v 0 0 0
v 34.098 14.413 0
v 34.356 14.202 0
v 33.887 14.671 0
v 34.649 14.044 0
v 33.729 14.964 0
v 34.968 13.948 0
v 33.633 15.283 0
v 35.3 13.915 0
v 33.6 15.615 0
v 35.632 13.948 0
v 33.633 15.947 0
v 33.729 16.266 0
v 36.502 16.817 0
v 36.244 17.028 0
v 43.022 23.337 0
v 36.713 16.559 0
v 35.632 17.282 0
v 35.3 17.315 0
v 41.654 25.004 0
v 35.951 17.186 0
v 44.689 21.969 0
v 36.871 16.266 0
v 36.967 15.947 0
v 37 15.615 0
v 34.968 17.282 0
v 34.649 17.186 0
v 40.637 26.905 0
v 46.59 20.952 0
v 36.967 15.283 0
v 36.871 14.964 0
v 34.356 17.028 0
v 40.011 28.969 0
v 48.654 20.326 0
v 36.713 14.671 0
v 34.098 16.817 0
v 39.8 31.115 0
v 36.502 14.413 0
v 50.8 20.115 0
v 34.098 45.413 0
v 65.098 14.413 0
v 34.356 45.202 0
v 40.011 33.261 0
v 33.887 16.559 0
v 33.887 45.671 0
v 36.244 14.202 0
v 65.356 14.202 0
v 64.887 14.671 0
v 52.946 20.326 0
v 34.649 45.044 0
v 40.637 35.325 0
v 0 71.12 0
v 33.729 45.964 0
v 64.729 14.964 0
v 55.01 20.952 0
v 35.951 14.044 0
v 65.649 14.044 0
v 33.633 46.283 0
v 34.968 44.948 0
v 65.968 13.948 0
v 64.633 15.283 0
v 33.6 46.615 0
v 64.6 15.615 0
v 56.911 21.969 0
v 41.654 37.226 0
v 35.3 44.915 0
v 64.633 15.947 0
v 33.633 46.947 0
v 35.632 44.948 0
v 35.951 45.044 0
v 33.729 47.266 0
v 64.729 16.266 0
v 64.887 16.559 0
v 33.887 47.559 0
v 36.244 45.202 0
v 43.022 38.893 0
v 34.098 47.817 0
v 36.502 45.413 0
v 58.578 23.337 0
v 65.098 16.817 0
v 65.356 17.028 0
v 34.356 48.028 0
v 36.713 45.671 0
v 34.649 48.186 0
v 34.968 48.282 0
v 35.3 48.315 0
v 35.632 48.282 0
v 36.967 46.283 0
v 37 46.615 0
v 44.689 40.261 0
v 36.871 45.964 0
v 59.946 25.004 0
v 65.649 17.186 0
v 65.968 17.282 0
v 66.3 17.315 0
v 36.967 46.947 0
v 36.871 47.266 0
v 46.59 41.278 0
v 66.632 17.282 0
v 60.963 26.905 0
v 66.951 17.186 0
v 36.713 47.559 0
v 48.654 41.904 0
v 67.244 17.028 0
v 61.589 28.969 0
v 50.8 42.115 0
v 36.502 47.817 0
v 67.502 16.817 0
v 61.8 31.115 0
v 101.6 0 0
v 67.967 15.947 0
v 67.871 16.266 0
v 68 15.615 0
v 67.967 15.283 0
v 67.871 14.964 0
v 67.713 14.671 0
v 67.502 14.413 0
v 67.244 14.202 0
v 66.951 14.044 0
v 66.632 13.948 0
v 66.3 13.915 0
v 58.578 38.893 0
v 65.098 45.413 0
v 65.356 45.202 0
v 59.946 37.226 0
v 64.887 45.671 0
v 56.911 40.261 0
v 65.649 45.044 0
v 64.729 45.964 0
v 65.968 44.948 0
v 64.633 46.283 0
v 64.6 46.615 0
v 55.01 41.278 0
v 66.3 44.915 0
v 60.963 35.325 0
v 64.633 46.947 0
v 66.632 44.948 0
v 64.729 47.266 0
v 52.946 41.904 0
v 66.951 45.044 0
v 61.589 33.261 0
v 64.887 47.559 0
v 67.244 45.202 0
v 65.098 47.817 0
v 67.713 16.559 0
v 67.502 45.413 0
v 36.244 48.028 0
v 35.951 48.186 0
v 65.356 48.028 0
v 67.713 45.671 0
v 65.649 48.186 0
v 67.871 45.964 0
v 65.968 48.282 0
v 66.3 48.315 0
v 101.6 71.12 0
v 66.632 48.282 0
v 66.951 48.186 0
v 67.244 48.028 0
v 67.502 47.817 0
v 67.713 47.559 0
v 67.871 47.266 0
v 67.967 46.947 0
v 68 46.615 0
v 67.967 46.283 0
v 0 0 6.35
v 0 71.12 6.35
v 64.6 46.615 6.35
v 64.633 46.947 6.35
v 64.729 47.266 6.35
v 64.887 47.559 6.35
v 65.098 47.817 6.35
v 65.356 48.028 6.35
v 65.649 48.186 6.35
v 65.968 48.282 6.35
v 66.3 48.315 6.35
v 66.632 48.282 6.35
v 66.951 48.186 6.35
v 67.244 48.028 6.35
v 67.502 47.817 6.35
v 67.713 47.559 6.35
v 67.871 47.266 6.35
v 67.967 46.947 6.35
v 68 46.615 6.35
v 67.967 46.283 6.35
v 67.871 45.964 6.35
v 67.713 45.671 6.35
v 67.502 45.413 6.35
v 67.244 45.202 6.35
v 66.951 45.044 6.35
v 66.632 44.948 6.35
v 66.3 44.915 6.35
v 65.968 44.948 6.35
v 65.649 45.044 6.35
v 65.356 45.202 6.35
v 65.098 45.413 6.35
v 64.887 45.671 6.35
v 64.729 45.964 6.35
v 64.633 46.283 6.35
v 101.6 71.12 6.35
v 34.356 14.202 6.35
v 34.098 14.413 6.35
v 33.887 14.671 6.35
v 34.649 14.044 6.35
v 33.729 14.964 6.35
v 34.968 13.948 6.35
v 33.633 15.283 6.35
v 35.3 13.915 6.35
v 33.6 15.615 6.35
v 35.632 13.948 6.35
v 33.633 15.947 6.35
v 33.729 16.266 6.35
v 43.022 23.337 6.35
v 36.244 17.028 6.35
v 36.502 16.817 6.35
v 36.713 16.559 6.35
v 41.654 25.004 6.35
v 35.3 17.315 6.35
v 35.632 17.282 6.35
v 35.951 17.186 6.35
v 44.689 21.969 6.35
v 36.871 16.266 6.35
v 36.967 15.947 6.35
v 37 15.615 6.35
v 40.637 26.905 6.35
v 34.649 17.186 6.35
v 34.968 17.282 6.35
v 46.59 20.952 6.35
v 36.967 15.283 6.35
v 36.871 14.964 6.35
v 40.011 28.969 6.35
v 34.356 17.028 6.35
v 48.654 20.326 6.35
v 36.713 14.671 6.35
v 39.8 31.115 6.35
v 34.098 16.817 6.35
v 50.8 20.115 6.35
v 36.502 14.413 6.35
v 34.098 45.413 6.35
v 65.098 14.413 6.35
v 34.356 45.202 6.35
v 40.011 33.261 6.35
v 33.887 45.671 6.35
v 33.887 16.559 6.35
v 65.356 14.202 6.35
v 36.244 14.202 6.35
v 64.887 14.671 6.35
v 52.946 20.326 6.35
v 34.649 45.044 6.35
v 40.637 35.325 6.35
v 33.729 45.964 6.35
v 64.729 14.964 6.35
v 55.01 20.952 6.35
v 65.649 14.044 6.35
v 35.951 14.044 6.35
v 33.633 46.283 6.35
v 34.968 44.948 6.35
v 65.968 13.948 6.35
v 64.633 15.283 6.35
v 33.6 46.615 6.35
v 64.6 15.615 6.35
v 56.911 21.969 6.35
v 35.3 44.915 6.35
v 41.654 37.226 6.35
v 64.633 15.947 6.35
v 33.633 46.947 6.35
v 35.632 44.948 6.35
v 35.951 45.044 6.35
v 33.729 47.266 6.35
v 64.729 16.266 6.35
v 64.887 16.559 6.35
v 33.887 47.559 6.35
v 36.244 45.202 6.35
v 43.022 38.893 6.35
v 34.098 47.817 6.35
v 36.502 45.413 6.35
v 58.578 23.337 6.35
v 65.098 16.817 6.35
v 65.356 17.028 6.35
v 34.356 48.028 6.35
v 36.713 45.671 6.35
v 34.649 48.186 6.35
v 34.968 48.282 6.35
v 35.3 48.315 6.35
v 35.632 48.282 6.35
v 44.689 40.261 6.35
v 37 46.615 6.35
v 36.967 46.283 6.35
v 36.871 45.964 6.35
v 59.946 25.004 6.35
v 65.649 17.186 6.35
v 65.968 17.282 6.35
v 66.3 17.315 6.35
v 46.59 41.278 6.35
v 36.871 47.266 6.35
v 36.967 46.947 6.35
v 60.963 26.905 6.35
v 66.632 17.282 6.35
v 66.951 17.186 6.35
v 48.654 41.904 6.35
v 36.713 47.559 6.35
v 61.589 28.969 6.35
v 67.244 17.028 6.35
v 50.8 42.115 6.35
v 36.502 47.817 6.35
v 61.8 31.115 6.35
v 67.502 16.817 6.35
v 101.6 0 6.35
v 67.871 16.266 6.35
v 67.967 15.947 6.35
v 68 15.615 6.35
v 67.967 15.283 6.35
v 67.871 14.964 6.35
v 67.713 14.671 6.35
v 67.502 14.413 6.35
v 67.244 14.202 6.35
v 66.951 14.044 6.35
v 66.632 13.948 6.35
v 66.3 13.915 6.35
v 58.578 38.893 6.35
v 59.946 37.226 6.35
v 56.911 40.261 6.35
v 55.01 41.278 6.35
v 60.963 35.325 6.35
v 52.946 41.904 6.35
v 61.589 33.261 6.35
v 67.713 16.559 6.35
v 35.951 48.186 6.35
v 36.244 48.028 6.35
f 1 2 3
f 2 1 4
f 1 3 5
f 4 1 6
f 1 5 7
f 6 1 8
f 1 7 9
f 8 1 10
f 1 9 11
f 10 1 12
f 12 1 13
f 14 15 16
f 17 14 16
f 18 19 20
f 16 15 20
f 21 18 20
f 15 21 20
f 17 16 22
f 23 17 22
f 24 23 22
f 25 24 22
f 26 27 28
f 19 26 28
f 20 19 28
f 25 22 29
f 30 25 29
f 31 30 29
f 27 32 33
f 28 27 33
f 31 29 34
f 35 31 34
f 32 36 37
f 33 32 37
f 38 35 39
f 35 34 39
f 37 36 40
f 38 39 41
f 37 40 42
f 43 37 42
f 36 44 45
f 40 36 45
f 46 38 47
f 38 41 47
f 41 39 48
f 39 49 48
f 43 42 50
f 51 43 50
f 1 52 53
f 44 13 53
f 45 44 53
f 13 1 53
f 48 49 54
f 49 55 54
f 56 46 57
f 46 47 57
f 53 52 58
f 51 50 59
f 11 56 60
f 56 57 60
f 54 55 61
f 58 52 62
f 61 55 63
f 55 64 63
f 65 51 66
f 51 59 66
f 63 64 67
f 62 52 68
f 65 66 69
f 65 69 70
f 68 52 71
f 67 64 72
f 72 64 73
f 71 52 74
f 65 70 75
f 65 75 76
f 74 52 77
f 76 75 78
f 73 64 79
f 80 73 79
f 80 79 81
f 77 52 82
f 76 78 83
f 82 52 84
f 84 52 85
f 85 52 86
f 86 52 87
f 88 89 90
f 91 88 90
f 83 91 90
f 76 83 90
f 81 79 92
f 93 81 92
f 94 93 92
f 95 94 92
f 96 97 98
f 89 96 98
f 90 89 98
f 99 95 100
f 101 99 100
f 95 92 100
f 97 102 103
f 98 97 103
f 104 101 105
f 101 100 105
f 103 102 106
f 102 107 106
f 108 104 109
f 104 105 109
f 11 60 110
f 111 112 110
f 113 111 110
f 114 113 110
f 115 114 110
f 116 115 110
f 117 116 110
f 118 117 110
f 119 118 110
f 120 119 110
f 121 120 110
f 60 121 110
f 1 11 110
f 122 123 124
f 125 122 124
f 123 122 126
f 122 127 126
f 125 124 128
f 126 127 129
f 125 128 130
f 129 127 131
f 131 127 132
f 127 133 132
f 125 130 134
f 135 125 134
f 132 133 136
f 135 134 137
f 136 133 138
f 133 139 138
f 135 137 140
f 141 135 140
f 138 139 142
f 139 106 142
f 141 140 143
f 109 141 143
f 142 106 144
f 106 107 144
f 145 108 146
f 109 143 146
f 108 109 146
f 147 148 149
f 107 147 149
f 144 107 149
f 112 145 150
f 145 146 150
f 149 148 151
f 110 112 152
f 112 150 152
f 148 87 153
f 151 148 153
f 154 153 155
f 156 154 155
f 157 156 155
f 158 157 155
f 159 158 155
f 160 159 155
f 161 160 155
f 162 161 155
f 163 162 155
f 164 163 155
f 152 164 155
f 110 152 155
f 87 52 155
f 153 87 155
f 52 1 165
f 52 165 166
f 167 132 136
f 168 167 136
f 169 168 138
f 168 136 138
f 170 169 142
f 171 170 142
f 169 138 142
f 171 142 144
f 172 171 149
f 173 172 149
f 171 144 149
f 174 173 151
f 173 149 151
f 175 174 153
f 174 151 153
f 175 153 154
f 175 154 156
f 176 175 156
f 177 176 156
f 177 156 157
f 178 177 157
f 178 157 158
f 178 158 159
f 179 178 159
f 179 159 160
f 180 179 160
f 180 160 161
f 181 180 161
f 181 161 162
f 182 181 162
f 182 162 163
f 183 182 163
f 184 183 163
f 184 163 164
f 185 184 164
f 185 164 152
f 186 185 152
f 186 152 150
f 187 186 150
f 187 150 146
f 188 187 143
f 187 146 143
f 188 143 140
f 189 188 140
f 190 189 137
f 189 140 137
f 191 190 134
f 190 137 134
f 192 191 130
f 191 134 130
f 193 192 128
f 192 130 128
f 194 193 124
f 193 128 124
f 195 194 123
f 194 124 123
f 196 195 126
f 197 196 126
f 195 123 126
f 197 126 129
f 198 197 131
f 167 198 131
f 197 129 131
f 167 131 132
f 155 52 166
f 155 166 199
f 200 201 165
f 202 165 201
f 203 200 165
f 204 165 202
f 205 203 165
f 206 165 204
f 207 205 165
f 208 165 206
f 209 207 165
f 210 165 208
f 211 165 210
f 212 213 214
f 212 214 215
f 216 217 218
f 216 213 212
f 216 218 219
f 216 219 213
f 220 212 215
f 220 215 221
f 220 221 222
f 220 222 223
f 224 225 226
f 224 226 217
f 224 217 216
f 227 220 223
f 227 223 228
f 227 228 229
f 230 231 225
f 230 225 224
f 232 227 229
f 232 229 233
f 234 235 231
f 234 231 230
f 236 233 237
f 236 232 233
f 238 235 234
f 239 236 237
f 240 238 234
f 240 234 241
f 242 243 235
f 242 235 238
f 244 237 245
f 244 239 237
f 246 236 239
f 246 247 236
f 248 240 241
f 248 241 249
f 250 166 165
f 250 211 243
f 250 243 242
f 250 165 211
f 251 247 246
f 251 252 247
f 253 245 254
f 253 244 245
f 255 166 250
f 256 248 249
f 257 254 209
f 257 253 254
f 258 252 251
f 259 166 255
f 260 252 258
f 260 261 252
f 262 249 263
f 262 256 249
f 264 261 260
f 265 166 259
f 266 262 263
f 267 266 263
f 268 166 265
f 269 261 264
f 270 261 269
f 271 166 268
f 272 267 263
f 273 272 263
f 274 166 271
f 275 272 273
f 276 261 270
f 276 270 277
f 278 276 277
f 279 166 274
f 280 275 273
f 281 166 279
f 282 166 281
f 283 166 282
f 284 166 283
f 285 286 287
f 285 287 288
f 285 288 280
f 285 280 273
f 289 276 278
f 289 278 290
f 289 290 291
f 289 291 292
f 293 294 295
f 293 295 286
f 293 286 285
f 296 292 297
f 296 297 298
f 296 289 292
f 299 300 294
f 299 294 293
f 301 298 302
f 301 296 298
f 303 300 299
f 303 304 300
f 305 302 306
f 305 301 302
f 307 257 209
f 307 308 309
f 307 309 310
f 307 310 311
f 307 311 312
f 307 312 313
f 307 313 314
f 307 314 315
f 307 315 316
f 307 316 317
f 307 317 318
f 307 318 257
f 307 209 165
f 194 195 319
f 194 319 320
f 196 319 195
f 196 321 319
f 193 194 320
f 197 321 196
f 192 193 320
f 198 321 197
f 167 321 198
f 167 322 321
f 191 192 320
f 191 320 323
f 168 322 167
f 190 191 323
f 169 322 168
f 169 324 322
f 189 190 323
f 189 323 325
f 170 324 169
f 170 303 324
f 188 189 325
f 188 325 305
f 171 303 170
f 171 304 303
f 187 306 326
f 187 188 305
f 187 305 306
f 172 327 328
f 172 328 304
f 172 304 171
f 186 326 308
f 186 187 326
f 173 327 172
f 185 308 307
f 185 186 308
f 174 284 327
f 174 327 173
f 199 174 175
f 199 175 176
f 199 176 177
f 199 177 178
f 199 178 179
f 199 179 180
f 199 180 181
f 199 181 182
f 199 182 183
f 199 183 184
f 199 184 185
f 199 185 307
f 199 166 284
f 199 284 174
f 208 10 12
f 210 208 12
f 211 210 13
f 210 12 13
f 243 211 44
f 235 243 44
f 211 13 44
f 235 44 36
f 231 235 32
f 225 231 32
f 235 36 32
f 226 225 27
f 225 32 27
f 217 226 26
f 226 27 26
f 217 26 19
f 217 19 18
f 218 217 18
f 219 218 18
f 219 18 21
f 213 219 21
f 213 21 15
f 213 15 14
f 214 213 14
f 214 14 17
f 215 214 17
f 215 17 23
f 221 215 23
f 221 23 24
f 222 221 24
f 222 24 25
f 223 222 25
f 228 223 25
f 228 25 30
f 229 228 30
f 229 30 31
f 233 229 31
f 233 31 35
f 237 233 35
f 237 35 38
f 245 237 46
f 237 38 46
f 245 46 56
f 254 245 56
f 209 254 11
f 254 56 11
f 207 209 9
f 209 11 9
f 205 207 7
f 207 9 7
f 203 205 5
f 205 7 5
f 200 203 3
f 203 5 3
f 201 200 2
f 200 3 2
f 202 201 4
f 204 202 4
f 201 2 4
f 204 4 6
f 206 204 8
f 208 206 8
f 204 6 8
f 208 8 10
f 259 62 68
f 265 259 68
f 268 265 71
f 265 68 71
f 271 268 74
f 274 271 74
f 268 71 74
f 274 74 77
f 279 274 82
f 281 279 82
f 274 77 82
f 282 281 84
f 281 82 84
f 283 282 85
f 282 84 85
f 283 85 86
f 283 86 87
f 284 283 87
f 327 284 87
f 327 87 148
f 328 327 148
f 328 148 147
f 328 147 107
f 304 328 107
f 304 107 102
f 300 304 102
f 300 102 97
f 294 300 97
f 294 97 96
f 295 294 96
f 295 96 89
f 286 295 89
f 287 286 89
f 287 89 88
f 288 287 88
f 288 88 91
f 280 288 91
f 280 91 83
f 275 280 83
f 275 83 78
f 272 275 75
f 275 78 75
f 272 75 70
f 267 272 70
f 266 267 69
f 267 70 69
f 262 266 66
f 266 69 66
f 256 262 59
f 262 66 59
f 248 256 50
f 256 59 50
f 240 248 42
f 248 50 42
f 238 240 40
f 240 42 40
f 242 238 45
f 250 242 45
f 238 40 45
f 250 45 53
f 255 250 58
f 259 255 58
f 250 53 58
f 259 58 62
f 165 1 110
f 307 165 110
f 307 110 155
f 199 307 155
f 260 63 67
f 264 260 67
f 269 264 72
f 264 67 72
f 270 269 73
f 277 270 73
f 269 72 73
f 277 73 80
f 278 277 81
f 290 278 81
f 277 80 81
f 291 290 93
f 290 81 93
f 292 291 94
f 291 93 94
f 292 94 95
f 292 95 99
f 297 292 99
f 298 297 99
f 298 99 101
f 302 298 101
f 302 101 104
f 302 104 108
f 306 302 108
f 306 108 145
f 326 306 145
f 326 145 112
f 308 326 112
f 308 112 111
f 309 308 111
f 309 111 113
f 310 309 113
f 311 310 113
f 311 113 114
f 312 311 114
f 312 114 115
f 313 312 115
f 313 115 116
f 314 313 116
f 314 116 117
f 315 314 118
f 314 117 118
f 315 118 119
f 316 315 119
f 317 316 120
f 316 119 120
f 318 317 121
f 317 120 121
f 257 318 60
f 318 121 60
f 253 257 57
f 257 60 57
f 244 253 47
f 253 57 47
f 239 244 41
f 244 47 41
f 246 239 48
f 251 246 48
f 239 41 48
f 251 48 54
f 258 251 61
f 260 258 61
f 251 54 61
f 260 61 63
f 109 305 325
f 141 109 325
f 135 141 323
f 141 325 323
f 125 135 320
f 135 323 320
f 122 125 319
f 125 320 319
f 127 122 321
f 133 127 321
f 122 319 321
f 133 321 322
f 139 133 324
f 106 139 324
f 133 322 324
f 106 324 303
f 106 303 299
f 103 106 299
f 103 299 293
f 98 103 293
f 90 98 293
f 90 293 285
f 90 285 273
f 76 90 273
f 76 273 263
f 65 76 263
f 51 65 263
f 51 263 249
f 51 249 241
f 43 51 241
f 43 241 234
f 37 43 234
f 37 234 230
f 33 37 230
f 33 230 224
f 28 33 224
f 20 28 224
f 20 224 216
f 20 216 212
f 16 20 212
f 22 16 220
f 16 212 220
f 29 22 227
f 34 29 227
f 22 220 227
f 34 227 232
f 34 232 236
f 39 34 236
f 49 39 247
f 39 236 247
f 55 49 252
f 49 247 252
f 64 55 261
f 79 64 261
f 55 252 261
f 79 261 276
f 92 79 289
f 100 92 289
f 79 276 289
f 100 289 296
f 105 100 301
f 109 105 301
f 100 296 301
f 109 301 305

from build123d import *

# Parameters (mm, degrees)
SKETCH1_W              = 101.6
SKETCH1_H              = 71.12
BASE_DEPTH             = 6.35
MOTOR_MOUNTING_HOLES_D = 3.4
SKETCH4_R              = 11
CUT_EXTRUDE1_DEPTH     = 125.181064982


with BuildPart() as part:
    # Sketch1 → base (new body)
    with BuildSketch(Plane.XY):
        with Locations((50.8, 35.56)):
            Rectangle(SKETCH1_W, SKETCH1_H)
    extrude(amount=BASE_DEPTH)

    # motor mounting holes (through all)
    with Locations(Plane.XY.offset(6.35)):
        with Locations((35.3, 46.615), (66.3, 15.615), (35.3, 15.615), (66.3, 46.615)):
            Hole(MOTOR_MOUNTING_HOLES_D / 2)

    # Sketch4 → Cut-Extrude1 (cut, through all)
    with BuildSketch(Plane.XY.offset(6.35)):
        with Locations((50.8, 31.115)):
            Circle(SKETCH4_R)
    extrude(amount=-CUT_EXTRUDE1_DEPTH, mode=Mode.SUBTRACT)


solid = part.part
